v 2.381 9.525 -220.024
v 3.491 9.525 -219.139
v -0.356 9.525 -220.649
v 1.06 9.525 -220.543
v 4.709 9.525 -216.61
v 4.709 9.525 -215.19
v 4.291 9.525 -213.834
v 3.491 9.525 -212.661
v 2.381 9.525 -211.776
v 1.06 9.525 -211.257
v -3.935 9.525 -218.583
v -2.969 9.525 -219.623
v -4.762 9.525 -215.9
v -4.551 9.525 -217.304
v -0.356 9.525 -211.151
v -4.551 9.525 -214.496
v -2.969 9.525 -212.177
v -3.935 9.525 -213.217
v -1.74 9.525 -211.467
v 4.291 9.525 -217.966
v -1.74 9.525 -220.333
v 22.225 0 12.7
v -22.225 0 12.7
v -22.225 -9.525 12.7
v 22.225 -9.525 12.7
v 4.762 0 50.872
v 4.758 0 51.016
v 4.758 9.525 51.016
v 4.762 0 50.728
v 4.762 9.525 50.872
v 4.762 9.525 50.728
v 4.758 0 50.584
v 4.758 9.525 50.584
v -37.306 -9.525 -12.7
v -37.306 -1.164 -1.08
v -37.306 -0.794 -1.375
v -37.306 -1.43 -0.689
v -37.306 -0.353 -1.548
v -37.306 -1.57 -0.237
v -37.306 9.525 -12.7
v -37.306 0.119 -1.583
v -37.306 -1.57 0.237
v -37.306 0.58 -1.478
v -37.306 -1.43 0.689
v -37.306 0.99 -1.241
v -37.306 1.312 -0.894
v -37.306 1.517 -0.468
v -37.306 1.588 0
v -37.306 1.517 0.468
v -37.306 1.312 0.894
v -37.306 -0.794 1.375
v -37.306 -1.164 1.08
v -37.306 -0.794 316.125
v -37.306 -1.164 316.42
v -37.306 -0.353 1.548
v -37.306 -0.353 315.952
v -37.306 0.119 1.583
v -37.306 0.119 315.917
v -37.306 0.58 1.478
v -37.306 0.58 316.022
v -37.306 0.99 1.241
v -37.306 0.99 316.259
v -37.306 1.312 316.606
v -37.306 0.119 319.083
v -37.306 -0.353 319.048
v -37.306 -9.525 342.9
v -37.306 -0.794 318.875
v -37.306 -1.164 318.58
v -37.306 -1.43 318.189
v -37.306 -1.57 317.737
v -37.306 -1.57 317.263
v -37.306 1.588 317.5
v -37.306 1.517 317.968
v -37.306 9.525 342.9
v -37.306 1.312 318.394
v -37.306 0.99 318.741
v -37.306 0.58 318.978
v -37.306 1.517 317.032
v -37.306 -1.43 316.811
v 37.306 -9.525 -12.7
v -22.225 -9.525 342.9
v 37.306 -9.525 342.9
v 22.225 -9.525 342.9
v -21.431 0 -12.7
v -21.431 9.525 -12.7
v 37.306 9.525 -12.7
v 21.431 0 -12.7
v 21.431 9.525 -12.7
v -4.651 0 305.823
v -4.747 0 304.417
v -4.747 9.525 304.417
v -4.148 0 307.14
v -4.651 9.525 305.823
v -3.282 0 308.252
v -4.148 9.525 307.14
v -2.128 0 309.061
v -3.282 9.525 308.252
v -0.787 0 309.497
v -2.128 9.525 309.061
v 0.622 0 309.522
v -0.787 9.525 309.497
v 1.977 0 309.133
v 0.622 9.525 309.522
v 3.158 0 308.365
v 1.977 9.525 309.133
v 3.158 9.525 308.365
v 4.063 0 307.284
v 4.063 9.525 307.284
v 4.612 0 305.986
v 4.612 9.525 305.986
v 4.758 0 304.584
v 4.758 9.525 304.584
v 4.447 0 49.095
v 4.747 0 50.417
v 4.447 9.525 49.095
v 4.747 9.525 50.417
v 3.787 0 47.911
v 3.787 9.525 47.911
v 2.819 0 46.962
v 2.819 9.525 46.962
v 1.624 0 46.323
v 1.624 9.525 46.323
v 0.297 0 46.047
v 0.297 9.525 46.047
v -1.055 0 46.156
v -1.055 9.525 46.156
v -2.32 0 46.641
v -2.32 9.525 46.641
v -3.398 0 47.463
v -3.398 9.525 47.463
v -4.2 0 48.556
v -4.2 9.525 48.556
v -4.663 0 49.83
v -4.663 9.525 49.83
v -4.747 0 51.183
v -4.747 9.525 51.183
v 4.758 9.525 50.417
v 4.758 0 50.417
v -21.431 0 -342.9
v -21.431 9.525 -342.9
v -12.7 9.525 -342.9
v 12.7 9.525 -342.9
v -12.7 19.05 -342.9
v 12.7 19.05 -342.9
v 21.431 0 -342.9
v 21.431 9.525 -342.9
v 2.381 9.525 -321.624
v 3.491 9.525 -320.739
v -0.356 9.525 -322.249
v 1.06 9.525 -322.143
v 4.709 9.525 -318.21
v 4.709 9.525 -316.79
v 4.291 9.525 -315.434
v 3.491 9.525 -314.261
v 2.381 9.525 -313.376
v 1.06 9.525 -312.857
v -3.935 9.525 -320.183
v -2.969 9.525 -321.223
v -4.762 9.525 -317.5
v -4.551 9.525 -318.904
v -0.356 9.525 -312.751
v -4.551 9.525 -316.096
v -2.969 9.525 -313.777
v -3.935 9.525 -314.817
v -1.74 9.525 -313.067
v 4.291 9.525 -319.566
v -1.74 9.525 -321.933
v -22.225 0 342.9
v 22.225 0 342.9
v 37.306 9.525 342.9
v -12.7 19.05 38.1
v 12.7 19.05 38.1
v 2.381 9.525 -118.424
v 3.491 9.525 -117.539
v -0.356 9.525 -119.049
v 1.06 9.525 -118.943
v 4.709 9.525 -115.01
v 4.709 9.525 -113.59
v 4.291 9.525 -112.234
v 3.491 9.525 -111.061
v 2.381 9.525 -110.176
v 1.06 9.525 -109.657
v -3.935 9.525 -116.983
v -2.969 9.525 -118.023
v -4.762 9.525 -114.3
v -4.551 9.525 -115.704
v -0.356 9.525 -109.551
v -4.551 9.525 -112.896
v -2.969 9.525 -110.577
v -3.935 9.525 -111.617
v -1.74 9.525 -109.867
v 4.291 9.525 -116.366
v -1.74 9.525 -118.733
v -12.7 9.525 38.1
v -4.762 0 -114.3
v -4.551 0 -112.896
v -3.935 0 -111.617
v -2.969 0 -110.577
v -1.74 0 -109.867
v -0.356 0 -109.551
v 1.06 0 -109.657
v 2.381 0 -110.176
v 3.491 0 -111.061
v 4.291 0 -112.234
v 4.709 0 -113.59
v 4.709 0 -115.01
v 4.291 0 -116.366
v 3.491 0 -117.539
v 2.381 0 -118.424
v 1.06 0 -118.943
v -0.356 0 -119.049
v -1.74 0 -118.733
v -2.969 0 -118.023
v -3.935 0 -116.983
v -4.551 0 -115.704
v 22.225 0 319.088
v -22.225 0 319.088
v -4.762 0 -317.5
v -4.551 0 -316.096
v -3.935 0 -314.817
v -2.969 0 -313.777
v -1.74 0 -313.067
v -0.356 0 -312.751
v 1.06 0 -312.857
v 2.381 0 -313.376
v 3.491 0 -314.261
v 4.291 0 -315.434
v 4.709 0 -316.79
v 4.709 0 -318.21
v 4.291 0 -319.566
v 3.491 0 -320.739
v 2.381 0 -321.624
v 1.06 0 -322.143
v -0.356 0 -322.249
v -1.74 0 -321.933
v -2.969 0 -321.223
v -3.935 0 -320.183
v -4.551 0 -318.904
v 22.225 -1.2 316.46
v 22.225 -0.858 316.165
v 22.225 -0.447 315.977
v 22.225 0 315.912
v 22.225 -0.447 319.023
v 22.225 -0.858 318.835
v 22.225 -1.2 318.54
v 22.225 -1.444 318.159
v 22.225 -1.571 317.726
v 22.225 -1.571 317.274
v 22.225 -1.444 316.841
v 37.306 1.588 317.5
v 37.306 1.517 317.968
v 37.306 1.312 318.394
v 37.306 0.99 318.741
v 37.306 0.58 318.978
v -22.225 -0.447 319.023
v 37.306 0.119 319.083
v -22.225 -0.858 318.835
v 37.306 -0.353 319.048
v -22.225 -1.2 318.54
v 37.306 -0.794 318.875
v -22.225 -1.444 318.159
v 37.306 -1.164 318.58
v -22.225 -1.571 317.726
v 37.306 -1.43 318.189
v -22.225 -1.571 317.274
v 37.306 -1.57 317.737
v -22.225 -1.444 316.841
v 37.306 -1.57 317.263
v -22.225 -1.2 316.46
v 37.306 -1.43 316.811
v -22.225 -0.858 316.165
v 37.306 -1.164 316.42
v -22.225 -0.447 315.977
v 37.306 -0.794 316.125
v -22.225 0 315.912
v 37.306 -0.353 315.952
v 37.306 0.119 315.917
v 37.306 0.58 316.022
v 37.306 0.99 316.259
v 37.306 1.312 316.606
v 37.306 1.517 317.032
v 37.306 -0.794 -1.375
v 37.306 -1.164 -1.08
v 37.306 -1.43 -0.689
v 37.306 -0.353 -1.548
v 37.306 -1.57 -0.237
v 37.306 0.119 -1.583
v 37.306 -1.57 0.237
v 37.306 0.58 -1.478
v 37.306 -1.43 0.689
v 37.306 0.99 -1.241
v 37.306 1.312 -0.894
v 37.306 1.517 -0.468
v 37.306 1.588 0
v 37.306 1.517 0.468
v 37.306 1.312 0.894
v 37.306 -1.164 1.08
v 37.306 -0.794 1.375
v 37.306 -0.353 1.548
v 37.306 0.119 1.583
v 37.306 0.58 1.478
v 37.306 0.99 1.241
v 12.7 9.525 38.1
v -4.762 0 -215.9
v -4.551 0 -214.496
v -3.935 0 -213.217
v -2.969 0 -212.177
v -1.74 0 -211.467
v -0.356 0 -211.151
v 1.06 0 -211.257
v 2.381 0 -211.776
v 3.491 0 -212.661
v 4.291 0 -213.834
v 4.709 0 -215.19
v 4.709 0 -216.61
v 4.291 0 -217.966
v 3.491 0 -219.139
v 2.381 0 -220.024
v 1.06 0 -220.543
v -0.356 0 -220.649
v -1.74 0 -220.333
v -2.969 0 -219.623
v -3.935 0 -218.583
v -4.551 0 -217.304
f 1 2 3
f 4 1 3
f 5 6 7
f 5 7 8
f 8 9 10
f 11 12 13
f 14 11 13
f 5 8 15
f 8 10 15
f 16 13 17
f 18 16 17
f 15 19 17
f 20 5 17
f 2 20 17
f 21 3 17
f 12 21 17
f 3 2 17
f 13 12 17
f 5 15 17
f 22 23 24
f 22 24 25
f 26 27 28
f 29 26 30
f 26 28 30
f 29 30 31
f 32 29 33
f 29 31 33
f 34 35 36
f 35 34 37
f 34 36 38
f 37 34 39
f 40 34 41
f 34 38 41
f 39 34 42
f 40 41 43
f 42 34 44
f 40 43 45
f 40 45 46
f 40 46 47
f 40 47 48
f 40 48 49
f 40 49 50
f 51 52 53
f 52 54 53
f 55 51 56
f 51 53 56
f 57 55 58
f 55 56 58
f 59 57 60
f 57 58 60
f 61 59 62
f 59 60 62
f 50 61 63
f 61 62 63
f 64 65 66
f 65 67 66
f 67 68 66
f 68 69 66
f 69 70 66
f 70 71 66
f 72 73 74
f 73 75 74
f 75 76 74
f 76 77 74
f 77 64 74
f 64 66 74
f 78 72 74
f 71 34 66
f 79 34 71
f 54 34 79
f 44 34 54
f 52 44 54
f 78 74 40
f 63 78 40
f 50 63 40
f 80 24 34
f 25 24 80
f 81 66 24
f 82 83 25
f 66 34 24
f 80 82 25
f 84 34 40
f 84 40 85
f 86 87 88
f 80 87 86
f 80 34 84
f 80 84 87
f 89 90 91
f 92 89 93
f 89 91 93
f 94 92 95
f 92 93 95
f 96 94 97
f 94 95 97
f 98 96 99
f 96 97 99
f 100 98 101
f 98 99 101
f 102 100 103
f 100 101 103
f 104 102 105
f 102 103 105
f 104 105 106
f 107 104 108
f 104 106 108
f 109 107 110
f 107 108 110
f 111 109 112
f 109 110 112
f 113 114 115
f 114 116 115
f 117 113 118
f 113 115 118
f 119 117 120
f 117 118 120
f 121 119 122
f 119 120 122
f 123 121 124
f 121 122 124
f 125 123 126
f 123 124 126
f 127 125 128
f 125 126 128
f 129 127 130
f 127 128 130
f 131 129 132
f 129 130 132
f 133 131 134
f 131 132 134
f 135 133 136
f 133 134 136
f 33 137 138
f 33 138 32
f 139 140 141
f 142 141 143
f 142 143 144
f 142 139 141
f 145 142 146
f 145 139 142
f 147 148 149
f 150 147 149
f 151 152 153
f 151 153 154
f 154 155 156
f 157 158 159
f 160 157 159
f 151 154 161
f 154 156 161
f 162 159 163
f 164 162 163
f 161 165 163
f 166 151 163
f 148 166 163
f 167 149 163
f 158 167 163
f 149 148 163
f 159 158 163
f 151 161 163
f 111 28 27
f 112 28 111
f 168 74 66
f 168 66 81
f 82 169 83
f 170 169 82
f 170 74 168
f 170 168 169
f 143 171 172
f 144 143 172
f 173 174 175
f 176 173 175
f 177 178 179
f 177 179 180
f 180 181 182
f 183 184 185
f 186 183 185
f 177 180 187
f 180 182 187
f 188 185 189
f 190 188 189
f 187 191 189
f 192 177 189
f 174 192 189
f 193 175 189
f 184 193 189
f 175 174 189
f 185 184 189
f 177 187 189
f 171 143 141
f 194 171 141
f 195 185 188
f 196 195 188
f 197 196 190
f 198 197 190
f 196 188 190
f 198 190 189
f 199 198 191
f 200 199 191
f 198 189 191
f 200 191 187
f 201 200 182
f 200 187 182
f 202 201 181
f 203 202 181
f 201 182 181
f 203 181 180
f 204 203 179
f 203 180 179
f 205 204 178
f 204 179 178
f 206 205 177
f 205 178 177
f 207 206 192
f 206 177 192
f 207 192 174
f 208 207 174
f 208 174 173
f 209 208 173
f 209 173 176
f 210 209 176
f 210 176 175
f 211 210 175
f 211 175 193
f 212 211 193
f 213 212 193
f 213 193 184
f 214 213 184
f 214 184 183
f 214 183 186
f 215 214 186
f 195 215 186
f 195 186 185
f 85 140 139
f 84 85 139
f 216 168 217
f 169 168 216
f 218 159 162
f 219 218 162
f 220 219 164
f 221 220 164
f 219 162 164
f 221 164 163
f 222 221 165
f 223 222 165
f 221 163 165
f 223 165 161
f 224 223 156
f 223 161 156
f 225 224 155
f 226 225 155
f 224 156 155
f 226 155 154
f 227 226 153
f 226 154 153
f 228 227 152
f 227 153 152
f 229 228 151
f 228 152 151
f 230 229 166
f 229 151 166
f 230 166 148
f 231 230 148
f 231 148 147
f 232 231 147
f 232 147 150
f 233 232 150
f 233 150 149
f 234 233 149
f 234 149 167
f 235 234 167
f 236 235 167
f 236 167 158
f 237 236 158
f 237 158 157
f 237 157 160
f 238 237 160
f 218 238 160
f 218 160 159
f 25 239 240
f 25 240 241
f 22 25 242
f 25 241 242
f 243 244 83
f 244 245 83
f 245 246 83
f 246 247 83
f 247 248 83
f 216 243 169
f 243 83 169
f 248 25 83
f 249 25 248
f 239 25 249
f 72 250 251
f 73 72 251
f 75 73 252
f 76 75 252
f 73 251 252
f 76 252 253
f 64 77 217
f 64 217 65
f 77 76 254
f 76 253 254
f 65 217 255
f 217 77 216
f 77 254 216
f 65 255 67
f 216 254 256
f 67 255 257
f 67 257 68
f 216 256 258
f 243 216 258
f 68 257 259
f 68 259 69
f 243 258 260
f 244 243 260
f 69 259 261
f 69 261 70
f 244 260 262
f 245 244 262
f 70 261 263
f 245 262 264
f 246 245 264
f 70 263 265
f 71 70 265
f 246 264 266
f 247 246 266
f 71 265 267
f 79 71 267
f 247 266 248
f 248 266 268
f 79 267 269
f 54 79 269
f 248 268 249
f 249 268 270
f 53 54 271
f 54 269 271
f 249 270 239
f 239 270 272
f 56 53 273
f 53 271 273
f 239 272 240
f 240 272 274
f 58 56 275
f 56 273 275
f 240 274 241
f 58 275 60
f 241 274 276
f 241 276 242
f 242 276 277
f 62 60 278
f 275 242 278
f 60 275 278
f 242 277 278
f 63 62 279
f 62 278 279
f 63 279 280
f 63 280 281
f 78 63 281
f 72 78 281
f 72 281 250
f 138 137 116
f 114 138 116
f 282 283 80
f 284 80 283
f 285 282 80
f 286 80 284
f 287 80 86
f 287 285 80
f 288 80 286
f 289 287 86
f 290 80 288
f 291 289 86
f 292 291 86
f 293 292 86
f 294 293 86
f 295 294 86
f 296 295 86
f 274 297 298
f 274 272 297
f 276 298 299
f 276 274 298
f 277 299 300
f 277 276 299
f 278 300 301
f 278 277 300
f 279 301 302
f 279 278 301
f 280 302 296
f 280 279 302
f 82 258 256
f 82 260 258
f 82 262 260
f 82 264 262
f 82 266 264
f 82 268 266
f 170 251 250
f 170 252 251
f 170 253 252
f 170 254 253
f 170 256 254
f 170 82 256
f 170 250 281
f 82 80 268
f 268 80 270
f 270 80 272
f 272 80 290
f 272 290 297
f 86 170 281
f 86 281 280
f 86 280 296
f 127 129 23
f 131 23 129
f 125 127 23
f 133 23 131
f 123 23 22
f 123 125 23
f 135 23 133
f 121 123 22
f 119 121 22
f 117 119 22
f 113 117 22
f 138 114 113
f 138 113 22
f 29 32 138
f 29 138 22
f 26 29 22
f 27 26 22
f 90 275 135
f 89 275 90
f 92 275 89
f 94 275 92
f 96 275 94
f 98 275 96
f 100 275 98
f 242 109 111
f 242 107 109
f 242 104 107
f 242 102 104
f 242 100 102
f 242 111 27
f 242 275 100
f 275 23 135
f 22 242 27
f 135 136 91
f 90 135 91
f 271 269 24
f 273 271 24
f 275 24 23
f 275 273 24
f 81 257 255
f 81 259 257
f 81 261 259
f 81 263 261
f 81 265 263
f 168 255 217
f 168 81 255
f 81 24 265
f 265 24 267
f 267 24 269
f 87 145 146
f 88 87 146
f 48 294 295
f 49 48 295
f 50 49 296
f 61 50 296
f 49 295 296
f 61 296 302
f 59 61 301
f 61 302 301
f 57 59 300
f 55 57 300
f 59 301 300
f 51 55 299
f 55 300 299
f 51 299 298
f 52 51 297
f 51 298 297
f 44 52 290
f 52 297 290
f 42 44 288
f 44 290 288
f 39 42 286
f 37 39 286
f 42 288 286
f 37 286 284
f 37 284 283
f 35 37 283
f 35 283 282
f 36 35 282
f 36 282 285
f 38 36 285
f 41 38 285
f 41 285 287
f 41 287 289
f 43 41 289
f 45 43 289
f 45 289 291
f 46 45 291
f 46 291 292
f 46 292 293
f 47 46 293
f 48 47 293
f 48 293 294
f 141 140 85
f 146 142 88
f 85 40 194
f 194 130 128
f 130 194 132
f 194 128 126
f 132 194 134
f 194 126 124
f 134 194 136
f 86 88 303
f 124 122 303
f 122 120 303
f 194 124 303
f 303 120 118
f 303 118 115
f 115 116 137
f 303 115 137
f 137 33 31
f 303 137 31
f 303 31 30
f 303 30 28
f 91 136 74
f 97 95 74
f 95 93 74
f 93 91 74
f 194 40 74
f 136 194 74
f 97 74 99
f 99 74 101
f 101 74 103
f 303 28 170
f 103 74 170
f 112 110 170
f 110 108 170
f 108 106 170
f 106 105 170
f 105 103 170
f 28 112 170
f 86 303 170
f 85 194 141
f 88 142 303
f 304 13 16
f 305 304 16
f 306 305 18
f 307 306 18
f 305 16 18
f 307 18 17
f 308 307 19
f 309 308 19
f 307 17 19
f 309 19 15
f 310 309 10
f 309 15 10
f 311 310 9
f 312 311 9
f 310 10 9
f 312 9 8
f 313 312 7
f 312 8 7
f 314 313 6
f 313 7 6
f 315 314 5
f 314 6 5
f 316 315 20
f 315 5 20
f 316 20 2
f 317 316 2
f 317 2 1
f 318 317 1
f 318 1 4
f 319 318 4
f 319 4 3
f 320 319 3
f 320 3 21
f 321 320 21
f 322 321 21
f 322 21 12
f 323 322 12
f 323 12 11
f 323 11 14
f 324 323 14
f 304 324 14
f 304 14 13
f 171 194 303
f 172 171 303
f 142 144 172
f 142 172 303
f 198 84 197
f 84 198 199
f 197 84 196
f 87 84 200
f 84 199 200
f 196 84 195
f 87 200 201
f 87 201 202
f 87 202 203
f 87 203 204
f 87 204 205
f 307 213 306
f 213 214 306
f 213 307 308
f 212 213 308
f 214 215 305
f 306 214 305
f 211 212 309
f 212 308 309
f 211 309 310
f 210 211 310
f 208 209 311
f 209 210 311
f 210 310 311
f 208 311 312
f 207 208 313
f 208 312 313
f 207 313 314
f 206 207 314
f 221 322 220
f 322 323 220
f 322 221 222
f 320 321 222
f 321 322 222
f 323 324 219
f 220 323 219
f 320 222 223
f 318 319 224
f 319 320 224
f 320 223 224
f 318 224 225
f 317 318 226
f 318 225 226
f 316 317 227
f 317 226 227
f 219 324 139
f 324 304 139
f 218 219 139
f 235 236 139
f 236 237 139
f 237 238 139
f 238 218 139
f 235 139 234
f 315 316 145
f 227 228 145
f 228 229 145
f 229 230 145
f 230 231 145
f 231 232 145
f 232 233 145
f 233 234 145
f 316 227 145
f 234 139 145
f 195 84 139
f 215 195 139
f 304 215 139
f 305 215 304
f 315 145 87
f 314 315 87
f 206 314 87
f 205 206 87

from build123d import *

# Parameters (mm, degrees)
F0_W      = 74.6125
F0_H      = 19.05
F1_DEPTH  = 342.9
F2_W      = 25.4
F2_H      = 19.05
F3_DEPTH  = 381
F4_W      = 44.45
F4_H      = 19.05
F5_DEPTH  = 330.2
F6_W      = 6.35
F6_H      = 19.05
F6_W_2    = 0.79375
F6_H_2    = 9.525
F6_W_3    = 42.8625
F7_DEPTH  = 330.2
F9_D      = 9.525
F9_DEPTH  = 19.051
F10_W     = 9.504689079
F10_H     = 254.1668581462
F11_DEPTH = 19.051
F13_D     = 3.175


with BuildPart() as f1:
    # F0 (on Top) → F1 (new body, symmetric)
    with BuildSketch(Plane.XY):
        Rectangle(F0_W, F0_H)
    extrude(amount=F1_DEPTH, both=True)

    # F2 (on face) → F3 (join)
    with BuildSketch(Plane(origin=(0, 0, -342.9), x_dir=(1, 0, 0), z_dir=(0, 0, -1))):
        with Locations((0, -9.525)):
            Rectangle(F2_W, F2_H)
    extrude(amount=-F3_DEPTH)

    # F4 (on face) → F5 (cut)
    with BuildSketch(Plane.XY.offset(342.9)):
        with Locations((0, -9.525)):
            Rectangle(F4_W, F4_H)
    extrude(amount=-F5_DEPTH, mode=Mode.SUBTRACT)

    # F6 (on face) → F7 (cut)
    with BuildSketch(Plane(origin=(0, 0, -342.9), x_dir=(1, 0, 0), z_dir=(0, 0, -1))):
        with Locations((-34.13125, 0)):
            Rectangle(F6_W, F6_H)
        Polygon((-30.95625, 9.525), (-30.95625, -9.525), (-21.43125, -9.525), (-21.43125, 0), (-22.225, 0), (-22.225, 9.525), align=None)
        with Locations((-21.828125, 4.7625)):
            Rectangle(F6_W_2, F6_H_2)
        with Locations((0, 4.7625)):
            Rectangle(F6_W_3, F6_H_2)
        Polygon((22.225, 0), (21.43125, 0), (21.43125, -9.525), (30.95625, -9.525), (30.95625, 9.525), (22.225, 9.525), align=None)
        with Locations((21.828125, 4.7625)):
            Rectangle(F6_W_2, F6_H_2)
        with Locations((34.13125, 0)):
            Rectangle(F6_W, F6_H)
    extrude(amount=-F7_DEPTH, mode=Mode.SUBTRACT)

    # F9 (through all, one way)
    with BuildSketch(Plane(origin=(0, 9.525, 0), x_dir=(-1, 0, 0), z_dir=(0, 1, 0))):
        with Locations((0, -317.5), (0, -215.9), (0, -114.3), (0, 50.8), (0, 304.8)):
            Circle(F9_D / 2)
    extrude(amount=-F9_DEPTH, mode=Mode.SUBTRACT)

    # F10 (on face) → F11 (cut, through all)
    with BuildSketch(Plane(origin=(0, 9.525, 0), x_dir=(-1, 0, 0), z_dir=(0, 1, 0))):
        with Locations((-0.0052560493, 177.5006012835)):
            Rectangle(F10_W, F10_H)
    extrude(amount=-F11_DEPTH, mode=Mode.SUBTRACT)

    # F13 (through all)
    with Locations(Plane(origin=(-37.30625, 0, 0), x_dir=(0, -1, 0), z_dir=(-1, 0, 0))):
        with Locations((0, 317.5), (0, 0)):
            Hole(F13_D / 2)


solid = f1.part
